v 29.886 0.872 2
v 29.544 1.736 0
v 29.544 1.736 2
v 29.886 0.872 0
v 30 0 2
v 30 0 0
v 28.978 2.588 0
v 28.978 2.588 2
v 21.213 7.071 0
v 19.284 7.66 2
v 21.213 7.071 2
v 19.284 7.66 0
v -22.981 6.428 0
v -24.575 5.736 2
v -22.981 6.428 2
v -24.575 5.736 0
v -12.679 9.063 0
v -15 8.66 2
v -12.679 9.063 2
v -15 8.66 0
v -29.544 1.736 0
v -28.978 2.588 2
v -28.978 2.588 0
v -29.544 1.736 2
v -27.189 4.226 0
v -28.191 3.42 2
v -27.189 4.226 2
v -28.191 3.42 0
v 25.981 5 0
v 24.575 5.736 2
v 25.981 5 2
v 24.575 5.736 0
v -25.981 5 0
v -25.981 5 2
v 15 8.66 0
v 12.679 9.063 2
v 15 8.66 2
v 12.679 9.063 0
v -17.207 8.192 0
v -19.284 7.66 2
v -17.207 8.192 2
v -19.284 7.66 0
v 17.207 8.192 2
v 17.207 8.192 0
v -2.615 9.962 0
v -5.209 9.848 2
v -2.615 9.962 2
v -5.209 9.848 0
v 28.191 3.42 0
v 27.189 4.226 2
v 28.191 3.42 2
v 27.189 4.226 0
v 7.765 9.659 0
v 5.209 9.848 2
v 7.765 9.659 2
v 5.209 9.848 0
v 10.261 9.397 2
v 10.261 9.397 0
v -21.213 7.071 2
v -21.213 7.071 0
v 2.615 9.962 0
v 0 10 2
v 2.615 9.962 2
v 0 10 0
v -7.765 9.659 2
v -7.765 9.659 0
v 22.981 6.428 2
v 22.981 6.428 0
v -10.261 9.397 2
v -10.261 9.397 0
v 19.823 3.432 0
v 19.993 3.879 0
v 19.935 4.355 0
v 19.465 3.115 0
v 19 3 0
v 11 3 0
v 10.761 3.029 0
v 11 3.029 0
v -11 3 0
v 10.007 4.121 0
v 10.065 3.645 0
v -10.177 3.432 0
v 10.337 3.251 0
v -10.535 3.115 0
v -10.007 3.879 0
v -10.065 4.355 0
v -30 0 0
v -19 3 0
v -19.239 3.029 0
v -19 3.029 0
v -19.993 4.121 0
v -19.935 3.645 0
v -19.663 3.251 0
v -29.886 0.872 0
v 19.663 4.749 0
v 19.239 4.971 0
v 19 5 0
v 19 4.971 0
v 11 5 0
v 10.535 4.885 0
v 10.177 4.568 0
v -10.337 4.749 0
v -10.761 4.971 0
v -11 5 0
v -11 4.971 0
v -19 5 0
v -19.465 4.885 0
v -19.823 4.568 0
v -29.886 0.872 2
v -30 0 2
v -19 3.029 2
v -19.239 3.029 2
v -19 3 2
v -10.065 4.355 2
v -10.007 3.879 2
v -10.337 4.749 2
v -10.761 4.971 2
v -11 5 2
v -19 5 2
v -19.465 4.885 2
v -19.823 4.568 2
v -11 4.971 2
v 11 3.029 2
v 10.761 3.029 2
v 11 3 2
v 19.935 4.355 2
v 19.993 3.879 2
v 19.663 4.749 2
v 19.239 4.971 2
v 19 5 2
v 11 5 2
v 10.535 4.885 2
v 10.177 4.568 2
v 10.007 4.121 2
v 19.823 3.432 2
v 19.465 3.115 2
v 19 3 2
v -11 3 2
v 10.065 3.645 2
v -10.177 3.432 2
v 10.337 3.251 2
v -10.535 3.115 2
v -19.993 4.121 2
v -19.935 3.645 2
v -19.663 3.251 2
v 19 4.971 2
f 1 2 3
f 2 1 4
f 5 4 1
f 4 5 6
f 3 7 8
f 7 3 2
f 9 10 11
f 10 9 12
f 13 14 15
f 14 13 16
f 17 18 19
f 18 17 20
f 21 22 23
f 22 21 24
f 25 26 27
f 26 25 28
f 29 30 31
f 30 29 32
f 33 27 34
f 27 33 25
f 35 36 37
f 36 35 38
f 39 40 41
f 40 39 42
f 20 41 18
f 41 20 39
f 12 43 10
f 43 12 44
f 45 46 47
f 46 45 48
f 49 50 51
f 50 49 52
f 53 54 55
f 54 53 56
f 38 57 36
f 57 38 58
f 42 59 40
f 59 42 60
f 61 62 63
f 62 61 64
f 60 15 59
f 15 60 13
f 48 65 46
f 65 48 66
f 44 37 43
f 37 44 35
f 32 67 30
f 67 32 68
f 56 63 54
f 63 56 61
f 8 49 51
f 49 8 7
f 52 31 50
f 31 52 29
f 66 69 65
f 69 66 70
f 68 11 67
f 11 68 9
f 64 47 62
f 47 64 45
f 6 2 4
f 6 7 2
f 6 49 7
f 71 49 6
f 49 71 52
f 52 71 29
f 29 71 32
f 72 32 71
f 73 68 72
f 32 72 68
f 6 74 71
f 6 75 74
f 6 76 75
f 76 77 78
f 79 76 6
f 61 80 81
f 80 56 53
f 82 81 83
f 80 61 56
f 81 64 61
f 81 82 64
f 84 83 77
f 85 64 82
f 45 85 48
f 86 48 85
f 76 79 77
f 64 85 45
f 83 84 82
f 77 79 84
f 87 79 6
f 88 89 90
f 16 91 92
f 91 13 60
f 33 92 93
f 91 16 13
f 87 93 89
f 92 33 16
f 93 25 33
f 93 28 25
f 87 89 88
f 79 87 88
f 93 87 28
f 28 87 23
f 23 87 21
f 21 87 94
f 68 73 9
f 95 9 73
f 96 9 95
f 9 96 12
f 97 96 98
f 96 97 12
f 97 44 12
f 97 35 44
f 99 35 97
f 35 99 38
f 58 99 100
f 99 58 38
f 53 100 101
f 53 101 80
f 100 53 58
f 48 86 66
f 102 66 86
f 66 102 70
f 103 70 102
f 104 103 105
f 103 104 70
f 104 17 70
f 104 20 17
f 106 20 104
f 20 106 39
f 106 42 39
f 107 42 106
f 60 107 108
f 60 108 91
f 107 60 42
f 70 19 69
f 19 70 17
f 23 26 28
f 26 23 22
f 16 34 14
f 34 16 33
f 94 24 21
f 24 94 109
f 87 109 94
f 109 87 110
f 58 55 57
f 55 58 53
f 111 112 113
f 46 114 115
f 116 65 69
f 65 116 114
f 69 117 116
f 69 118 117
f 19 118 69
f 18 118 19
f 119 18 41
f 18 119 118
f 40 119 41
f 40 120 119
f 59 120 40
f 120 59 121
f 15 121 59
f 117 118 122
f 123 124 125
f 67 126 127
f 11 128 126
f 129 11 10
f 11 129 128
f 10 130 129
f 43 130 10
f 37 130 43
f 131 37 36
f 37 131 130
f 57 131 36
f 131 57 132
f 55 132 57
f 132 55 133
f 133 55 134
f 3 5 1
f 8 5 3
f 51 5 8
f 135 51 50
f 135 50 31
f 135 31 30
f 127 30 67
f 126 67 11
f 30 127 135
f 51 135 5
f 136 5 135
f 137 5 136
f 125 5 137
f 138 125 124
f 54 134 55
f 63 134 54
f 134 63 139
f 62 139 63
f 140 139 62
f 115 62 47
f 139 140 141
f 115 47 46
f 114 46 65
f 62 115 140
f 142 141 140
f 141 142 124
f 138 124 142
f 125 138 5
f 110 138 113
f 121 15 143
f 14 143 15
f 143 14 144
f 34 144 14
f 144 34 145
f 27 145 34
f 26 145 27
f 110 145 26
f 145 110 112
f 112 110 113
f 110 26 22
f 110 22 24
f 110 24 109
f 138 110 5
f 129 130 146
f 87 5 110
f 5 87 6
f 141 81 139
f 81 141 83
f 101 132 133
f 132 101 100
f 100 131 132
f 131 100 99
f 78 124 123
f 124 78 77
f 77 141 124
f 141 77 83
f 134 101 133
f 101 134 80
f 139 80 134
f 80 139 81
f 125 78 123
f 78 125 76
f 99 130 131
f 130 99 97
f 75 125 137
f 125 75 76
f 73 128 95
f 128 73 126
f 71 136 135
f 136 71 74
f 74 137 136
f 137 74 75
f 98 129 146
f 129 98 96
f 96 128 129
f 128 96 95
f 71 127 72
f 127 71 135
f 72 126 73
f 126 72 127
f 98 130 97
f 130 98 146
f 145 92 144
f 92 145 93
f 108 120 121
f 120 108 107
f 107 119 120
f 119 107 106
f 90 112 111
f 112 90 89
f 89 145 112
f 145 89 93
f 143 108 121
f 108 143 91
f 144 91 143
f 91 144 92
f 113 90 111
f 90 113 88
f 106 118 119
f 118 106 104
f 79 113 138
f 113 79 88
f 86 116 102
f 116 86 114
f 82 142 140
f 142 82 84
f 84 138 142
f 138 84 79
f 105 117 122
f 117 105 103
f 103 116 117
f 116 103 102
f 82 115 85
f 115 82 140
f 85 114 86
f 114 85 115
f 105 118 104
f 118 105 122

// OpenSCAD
/* Begin of configuration */
lipo_length = 60;
lipo_height = 30;
lipo_width = 30;

thickness = 2;

lipo_strap_hole_length = 10;
lipo_strap_hole_height = 2;

lipo_strap_border_spacing = 10;
lipo_strap_middle_spacing = 10; // In percent from 0, based on lipo_length
lipo_strap_vertical_spacing = 30;

wing_min_width = 10;
wing_width_prcnt = 10; // Percentage of lipo_width

/* End of configuration */

$fs = $preview ? 4 : 0.5;
$fa = $preview ? 20 : 5;

strap_offset_border = prcntof(lipo_length, lipo_strap_border_spacing);
strap_offset_middle = prcntof(lipo_length, lipo_strap_middle_spacing);

function prcntof(value, percentage) = value / 100 * percentage;
function greater(val1, val2) = val1 > val2 ? val1 : val2;
function less(val1, val2) = val1 < val2 ? val1 : val2;
function is_uneven(value) = value % 2 ? true : false;
function is_less(val1, val2) = val1 < val2 ? true : false;
function is_greater(val1, val2) = val1 > val2 ? true : false;
function is_equal(val1, val2) = val1 == val2 ? true : false;
function restoffset(length, offsetl, offsetr) = offsetl + (length - offsetl - offsetr) / 2;

module cubic_inv(l = 1, d, h) {
	depth = d ? d : l;
	height = h ? h : l;
	for (i = [0:1:$children-1]) {
		difference() {
			cube([l, depth, height]);
			children(i);
		}
	}
}

module half_cylinder(h = 1, r = 0, d = 0, center = false) {
	radius = greater(r, d / 2);
	intersection() {
		cylinder(h = h, r = radius);
		translate([-radius, 0, 0]) cube([radius * 2, radius, h]);
	}
}

module lipo_strap_hole(width, depth, height) {
	difference() {
		cube([width, depth, height]);
		cubic_inv(depth / 2, depth, depth) translate([depth / 2, depth / 2, 0]) rotate([0, 0, 90]) half_cylinder(h = height, d = depth);
		translate([width - depth / 2, 0, 0]) cubic_inv(depth / 2, depth, depth) translate([0, depth / 2, 0]) rotate([0, 0, 270]) half_cylinder(h = height, d = depth);
	}
}

lipo_shield_top();

module lipo_shield_top() {
	wing_width = greater(prcntof(lipo_width, wing_width_prcnt), wing_min_width);
	//lipo_shield_base(lipo_length, thickness, lipo_width);
	lipo_shield_wing(lipo_length, wing_width, thickness);
}

module lipo_shield_bottom() {
	lipo_shield_base(lipo_length, lipo_width, thickness / 2);
}

module lipo_shield_wing(length, width, height) {
	difference() {
		resize([length, width, height]) half_cylinder(h = thickness, d = length);
		translate([0, prcntof(width, lipo_strap_vertical_spacing), 0 ]) {
			translate([restoffset(length / 2, strap_offset_middle, strap_offset_border) - lipo_strap_hole_length / 2, 0, 0]) lipo_strap_hole(lipo_strap_hole_length, lipo_strap_hole_height, height);
			translate([-restoffset(length / 2, strap_offset_middle, strap_offset_border) - lipo_strap_hole_length / 2, 0, 0]) lipo_strap_hole(lipo_strap_hole_length, lipo_strap_hole_height, height);
		}
	}
}

module lipo_shield_base(length, width, height) {
	cube([length, height, width]);
}
